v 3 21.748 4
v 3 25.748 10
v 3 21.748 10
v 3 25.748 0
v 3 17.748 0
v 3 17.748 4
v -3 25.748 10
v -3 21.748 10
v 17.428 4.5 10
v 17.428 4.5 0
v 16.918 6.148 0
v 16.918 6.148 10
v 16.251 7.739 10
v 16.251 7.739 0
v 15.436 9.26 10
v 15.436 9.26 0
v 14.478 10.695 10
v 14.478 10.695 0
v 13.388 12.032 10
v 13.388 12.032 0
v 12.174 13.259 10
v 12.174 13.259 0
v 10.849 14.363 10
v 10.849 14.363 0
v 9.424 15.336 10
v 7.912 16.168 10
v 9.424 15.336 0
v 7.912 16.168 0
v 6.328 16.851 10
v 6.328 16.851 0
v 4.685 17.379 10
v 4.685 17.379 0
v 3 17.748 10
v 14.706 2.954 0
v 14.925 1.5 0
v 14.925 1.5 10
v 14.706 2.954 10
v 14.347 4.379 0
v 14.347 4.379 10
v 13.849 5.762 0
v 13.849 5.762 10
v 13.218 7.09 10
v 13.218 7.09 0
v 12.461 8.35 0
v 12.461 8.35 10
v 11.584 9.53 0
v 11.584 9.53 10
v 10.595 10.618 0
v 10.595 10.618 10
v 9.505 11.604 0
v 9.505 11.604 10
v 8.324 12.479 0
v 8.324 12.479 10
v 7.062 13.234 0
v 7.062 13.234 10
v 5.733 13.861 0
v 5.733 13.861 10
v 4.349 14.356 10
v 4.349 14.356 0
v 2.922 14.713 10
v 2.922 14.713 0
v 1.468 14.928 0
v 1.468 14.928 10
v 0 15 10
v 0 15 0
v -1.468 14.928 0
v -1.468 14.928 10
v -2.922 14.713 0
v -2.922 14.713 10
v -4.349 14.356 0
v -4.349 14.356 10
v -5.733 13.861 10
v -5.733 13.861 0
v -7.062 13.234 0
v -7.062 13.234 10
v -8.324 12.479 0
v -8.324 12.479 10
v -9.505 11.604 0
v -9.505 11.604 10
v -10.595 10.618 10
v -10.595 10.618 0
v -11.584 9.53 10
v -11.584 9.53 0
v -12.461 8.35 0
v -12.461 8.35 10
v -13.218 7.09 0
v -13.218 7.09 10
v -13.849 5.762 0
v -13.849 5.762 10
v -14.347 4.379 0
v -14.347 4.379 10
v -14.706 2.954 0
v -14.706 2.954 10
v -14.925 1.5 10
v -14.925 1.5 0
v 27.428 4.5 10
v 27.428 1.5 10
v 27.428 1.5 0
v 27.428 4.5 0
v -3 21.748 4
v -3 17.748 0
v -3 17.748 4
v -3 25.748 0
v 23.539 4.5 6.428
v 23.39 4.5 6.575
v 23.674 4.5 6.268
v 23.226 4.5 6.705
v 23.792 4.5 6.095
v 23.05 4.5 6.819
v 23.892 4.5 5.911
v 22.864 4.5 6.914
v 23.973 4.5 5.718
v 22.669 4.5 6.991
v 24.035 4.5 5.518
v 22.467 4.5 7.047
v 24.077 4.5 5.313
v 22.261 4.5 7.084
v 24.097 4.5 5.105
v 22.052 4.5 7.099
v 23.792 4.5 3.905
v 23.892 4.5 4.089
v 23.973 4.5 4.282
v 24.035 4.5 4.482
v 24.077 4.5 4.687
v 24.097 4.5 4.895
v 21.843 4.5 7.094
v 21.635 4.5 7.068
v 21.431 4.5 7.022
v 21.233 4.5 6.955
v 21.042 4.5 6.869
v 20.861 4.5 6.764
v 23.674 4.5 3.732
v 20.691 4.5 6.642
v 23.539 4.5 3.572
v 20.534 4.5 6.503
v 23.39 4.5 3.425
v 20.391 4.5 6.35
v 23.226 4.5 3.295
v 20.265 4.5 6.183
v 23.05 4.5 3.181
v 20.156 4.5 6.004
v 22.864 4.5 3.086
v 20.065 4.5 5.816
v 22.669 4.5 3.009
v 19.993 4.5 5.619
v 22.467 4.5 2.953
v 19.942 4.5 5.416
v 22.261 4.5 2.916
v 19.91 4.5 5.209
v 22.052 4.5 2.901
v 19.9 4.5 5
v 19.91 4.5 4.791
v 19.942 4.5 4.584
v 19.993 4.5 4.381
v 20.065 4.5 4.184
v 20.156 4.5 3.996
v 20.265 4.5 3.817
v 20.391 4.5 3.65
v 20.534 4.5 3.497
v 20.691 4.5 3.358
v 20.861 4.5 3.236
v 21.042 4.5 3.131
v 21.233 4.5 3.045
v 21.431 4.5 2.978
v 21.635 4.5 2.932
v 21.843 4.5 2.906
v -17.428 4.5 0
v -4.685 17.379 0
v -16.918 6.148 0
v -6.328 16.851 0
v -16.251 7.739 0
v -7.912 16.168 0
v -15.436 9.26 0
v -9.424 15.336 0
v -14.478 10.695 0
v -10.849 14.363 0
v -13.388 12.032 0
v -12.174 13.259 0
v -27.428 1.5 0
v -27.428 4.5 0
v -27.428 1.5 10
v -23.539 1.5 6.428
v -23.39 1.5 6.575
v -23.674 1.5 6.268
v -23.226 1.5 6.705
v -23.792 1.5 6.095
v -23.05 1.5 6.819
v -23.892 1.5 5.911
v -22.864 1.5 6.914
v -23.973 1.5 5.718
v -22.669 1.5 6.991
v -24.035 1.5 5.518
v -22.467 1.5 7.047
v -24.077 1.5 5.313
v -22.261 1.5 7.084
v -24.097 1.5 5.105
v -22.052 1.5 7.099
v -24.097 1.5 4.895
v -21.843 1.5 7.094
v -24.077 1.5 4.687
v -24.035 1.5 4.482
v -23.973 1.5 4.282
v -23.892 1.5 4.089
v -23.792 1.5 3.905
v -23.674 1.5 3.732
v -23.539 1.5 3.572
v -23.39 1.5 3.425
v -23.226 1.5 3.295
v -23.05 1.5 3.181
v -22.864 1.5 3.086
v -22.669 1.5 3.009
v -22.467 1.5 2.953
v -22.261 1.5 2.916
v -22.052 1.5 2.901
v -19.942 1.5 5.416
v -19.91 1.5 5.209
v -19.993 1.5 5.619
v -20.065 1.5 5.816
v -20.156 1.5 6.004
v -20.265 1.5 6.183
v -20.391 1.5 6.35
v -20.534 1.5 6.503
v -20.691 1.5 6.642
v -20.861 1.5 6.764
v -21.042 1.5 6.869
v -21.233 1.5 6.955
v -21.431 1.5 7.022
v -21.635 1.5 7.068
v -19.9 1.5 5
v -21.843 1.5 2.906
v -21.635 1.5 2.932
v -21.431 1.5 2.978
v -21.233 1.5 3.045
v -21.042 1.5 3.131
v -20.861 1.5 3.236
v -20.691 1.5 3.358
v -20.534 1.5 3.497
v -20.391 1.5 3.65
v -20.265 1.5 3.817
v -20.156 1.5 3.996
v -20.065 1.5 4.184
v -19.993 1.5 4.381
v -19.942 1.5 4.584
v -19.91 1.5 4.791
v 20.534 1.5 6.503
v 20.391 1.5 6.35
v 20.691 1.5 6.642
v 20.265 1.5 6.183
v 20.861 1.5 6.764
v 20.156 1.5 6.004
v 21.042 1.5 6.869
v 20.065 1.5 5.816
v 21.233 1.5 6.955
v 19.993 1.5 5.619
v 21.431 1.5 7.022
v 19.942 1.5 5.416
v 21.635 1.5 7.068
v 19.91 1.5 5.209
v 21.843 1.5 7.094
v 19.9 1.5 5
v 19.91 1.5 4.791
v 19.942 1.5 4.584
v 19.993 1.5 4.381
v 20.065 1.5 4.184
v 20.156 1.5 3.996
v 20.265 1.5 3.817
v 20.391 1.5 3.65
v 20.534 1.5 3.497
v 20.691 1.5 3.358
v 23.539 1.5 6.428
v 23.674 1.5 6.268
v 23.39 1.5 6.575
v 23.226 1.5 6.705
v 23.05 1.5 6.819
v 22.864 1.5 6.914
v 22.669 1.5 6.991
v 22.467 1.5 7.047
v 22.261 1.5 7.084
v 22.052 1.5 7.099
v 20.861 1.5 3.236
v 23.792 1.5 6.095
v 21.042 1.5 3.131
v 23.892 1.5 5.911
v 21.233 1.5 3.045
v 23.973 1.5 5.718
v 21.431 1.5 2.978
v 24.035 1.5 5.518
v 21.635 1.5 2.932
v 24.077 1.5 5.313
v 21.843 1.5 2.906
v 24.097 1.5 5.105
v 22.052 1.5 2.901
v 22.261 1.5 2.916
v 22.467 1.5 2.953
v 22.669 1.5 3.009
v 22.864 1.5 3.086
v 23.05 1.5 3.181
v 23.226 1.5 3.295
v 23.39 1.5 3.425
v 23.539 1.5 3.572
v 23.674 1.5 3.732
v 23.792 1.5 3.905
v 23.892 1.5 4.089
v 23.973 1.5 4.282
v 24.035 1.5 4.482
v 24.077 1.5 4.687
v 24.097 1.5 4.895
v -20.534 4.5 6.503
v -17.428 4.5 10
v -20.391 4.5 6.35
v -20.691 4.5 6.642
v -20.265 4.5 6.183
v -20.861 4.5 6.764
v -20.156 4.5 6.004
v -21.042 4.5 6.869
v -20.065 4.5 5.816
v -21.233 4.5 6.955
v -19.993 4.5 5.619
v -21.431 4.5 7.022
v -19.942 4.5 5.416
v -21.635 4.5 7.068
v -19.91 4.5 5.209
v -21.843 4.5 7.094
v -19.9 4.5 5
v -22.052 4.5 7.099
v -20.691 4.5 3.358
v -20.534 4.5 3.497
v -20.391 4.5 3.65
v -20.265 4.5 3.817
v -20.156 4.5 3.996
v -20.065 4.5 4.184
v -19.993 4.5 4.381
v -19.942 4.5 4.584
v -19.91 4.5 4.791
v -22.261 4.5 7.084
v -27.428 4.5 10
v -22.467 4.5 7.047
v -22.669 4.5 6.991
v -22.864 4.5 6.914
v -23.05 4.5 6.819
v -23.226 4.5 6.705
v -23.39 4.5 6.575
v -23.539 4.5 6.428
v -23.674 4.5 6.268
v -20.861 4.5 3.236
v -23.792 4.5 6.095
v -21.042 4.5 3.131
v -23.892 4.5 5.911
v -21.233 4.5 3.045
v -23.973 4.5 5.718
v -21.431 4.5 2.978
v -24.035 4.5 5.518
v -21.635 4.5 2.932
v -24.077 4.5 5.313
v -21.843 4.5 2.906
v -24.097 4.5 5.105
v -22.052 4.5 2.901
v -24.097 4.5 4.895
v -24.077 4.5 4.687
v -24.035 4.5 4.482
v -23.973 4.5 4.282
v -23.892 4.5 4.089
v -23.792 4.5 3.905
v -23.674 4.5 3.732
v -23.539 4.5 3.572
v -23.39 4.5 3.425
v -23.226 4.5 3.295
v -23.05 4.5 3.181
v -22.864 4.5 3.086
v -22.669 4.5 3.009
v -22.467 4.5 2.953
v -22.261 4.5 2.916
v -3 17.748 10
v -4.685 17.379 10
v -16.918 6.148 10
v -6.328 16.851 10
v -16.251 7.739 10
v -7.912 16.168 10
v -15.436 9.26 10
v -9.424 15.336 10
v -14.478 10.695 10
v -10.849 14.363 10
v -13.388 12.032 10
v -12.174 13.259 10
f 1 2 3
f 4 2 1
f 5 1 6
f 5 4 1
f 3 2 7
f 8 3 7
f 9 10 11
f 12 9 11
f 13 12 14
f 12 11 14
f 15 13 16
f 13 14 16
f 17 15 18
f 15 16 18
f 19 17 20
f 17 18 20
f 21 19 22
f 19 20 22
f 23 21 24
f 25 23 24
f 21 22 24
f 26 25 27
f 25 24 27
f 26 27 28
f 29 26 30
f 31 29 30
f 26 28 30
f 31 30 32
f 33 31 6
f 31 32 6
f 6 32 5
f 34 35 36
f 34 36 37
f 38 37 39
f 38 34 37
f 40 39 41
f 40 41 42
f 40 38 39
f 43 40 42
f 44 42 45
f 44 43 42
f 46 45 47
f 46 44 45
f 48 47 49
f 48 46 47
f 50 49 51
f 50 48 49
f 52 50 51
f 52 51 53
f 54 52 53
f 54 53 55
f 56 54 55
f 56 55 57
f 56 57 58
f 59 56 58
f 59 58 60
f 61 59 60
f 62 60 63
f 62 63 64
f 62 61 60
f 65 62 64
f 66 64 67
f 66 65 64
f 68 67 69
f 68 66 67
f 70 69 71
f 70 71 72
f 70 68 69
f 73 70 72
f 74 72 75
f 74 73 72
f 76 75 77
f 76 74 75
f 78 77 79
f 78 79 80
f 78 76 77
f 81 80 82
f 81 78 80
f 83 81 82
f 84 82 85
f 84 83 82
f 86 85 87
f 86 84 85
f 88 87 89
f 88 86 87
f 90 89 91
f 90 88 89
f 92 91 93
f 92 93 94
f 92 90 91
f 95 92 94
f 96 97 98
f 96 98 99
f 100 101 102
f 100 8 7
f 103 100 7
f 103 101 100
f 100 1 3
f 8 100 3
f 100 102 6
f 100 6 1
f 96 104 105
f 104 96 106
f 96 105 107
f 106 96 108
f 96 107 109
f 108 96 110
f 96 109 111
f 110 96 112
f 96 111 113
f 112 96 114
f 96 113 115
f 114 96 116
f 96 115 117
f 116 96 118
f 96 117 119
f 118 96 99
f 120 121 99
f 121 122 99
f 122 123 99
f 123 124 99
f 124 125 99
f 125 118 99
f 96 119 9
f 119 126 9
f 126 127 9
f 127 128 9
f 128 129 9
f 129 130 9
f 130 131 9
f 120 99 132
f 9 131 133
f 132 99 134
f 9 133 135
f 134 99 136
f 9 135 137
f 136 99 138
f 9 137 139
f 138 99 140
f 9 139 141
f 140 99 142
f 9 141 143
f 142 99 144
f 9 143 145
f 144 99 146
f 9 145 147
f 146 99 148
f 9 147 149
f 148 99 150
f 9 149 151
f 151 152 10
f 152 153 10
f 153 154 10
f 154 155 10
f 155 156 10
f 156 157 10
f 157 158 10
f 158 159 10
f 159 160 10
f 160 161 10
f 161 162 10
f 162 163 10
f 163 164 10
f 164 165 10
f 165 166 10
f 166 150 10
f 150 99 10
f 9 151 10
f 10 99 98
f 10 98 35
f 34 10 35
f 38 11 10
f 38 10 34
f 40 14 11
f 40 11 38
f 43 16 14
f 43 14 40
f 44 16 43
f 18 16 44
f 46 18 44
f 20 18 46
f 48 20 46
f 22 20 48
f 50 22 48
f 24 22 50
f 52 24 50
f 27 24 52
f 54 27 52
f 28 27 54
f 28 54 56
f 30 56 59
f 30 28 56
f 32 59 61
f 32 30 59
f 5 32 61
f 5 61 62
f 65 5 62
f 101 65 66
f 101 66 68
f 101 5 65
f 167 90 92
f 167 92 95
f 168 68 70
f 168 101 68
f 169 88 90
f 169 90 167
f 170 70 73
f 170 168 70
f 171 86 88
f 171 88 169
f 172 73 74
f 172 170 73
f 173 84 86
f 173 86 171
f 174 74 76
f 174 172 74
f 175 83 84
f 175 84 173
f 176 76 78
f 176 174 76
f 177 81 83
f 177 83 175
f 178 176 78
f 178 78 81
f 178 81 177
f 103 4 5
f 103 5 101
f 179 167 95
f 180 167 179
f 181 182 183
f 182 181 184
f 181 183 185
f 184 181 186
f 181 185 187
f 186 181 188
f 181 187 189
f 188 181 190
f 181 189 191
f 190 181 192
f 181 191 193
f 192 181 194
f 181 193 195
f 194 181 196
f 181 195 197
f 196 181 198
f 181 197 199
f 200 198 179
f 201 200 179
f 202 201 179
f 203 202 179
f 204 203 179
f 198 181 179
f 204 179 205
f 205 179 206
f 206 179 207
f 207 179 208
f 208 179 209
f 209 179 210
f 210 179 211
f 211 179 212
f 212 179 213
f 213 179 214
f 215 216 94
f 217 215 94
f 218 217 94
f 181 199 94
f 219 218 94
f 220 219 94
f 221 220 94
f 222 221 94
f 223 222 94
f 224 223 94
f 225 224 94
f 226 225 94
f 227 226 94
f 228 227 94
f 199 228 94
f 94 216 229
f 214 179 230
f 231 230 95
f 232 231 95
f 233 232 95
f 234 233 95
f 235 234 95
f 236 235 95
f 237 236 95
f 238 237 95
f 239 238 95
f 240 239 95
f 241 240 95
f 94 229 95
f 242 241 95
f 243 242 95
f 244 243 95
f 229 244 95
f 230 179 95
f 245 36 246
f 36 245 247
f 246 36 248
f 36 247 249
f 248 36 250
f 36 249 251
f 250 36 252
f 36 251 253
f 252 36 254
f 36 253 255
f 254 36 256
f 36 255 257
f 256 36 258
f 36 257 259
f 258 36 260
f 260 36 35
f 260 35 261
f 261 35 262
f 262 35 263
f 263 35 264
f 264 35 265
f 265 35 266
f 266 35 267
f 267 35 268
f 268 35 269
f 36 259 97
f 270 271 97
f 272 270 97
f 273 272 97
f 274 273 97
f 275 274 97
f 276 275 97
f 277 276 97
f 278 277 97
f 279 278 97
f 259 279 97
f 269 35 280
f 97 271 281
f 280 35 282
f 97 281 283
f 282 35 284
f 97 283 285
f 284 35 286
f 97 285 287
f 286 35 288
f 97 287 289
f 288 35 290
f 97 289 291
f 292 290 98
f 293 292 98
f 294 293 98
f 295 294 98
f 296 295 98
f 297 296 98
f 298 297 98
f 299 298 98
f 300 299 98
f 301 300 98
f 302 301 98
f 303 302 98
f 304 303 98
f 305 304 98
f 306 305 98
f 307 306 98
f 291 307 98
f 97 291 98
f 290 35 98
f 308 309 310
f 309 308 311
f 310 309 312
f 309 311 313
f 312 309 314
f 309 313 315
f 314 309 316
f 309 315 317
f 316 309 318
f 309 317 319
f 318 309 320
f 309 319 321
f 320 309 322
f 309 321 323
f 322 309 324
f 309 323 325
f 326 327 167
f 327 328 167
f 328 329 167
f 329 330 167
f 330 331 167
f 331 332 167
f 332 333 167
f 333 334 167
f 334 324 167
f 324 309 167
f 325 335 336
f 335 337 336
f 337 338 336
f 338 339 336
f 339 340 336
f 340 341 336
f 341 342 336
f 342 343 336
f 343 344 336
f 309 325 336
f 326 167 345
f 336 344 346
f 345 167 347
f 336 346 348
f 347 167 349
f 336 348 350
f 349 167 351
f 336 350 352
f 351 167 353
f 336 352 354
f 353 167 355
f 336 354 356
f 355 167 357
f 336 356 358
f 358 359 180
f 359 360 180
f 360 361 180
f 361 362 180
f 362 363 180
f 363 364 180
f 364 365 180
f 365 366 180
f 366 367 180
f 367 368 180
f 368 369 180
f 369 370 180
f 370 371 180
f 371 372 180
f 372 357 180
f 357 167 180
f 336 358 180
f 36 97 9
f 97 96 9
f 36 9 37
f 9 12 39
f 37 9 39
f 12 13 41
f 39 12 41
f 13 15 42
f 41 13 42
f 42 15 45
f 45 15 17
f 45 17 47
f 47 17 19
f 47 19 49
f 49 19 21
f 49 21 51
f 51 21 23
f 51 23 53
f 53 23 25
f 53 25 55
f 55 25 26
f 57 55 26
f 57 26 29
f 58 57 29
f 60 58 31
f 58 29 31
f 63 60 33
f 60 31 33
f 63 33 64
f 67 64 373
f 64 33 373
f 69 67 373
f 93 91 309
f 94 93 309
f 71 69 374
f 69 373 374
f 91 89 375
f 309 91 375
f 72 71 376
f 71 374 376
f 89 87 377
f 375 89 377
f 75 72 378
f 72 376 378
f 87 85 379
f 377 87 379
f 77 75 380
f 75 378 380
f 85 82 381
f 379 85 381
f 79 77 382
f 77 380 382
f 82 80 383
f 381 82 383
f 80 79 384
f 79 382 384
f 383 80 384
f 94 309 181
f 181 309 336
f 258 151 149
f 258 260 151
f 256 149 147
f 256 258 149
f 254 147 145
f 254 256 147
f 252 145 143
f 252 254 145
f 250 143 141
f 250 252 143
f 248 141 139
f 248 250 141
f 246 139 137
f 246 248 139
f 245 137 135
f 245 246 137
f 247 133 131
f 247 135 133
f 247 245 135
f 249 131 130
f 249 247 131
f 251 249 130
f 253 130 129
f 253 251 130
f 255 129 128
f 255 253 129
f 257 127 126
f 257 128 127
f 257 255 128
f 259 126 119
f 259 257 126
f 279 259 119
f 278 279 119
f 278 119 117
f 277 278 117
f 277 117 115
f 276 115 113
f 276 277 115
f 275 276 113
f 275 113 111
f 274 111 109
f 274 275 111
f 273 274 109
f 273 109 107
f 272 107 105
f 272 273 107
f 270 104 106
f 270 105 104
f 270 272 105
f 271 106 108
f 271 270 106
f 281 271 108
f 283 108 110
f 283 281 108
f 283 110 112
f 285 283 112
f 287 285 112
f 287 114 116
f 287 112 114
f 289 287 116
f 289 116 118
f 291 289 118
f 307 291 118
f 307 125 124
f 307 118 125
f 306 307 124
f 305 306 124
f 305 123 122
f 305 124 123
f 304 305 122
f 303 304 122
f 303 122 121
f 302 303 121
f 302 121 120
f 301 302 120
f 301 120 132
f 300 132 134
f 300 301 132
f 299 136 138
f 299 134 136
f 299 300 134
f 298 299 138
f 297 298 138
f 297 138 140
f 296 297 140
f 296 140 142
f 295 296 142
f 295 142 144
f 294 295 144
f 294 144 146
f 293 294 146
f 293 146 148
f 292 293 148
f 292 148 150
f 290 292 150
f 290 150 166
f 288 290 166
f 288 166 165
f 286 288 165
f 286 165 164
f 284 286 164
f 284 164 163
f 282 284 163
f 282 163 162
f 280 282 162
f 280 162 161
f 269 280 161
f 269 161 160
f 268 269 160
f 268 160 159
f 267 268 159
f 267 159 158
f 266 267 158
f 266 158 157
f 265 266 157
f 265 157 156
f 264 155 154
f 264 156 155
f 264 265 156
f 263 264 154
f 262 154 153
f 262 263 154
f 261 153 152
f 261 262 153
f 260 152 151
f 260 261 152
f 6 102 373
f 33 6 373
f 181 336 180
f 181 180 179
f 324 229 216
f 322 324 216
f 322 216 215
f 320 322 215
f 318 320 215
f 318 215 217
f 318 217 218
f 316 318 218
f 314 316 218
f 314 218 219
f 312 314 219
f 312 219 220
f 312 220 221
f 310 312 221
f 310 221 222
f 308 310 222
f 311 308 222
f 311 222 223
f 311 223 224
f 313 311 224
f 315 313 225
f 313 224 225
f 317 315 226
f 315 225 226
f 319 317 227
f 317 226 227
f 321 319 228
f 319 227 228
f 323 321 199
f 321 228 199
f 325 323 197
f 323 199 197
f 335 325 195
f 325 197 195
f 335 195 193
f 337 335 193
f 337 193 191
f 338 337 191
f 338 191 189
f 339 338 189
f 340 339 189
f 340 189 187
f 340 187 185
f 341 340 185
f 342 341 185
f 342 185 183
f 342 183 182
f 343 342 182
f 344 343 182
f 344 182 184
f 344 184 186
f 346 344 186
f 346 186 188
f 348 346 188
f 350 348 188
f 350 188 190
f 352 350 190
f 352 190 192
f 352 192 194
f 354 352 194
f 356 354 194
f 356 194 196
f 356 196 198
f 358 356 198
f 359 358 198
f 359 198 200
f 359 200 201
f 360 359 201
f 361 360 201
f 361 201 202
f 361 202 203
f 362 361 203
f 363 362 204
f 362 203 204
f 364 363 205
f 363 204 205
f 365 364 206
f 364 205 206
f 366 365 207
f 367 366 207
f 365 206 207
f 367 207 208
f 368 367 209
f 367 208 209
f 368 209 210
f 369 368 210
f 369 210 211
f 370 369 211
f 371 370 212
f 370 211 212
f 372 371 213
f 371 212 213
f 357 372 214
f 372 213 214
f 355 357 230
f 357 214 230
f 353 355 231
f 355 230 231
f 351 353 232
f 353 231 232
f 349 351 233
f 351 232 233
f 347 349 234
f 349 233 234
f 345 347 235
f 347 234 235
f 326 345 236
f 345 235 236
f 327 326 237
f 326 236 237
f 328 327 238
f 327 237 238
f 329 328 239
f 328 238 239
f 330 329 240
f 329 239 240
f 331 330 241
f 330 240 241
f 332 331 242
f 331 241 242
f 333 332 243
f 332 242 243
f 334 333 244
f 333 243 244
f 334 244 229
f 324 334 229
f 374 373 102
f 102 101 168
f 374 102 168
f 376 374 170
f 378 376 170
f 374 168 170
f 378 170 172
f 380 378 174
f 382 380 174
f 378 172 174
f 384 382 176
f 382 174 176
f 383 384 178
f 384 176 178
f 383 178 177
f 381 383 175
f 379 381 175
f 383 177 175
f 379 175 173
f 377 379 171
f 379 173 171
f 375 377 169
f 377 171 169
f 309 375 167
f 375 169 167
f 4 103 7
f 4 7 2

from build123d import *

# Parameters (mm, degrees)
PAD_DEPTH            = 10
SKETCH001_R          = 2.1
POCKET_DEPTH         = 147.35929
SKETCH002_W          = 4
SKETCH002_H          = 6
POCKET001_DEPTH      = 27.429425
POCKET001_DEPTH_BACK = -27.429425


with BuildPart() as part:
    # Sketch → Pad (new body)
    with BuildSketch(Plane.XY):
        with BuildLine():
            ThreePointArc((14.924812, 1.5), (0, 15), (-14.924812, 1.5))
            Line((-27.428425, 1.5), (-14.924812, 1.5))
            Line((-27.428425, 4.5), (-27.428425, 1.5))
            Line((-17.428425, 4.5), (-27.428425, 4.5))
            ThreePointArc((-3, 17.748239), (-12.174116, 13.258616), (-17.428425, 4.5))
            Line((-3, 17.748239), (-3, 25.748239))
            Line((-3, 25.748239), (3, 25.748239))
            Line((3, 25.748239), (3, 17.748239))
            ThreePointArc((17.428425, 4.5), (12.174116, 13.258616), (3, 17.748239))
            Line((27.428425, 4.5), (17.428425, 4.5))
            Line((27.428425, 1.5), (27.428425, 4.5))
            Line((14.924812, 1.5), (27.428425, 1.5))
        make_face()
    extrude(amount=PAD_DEPTH)

    # Sketch001 → Pocket (cut, through all)
    with BuildSketch(Plane.XZ):
        with Locations((-22, 5)):
            Circle(SKETCH001_R)
    pocket = extrude(amount=-POCKET_DEPTH, mode=Mode.SUBTRACT)

    # Mirrored: Pocket across Sketch001 V_Axis
    add(pocket.mirror(Plane(origin=(0, 0, 0), x_dir=(0, -1, 0), z_dir=(1, 0, 0))), mode=Mode.SUBTRACT)

    # Sketch002 → Pocket001 (cut, two sides)
    with BuildSketch(Plane.YZ) as pocket001_sk:
        with Locations((19.748239, 7)):
            Rectangle(SKETCH002_W, SKETCH002_H)
    extrude(amount=-POCKET001_DEPTH, mode=Mode.SUBTRACT)
    extrude(pocket001_sk.sketch, amount=-POCKET001_DEPTH_BACK, mode=Mode.SUBTRACT)


solid = part.part
